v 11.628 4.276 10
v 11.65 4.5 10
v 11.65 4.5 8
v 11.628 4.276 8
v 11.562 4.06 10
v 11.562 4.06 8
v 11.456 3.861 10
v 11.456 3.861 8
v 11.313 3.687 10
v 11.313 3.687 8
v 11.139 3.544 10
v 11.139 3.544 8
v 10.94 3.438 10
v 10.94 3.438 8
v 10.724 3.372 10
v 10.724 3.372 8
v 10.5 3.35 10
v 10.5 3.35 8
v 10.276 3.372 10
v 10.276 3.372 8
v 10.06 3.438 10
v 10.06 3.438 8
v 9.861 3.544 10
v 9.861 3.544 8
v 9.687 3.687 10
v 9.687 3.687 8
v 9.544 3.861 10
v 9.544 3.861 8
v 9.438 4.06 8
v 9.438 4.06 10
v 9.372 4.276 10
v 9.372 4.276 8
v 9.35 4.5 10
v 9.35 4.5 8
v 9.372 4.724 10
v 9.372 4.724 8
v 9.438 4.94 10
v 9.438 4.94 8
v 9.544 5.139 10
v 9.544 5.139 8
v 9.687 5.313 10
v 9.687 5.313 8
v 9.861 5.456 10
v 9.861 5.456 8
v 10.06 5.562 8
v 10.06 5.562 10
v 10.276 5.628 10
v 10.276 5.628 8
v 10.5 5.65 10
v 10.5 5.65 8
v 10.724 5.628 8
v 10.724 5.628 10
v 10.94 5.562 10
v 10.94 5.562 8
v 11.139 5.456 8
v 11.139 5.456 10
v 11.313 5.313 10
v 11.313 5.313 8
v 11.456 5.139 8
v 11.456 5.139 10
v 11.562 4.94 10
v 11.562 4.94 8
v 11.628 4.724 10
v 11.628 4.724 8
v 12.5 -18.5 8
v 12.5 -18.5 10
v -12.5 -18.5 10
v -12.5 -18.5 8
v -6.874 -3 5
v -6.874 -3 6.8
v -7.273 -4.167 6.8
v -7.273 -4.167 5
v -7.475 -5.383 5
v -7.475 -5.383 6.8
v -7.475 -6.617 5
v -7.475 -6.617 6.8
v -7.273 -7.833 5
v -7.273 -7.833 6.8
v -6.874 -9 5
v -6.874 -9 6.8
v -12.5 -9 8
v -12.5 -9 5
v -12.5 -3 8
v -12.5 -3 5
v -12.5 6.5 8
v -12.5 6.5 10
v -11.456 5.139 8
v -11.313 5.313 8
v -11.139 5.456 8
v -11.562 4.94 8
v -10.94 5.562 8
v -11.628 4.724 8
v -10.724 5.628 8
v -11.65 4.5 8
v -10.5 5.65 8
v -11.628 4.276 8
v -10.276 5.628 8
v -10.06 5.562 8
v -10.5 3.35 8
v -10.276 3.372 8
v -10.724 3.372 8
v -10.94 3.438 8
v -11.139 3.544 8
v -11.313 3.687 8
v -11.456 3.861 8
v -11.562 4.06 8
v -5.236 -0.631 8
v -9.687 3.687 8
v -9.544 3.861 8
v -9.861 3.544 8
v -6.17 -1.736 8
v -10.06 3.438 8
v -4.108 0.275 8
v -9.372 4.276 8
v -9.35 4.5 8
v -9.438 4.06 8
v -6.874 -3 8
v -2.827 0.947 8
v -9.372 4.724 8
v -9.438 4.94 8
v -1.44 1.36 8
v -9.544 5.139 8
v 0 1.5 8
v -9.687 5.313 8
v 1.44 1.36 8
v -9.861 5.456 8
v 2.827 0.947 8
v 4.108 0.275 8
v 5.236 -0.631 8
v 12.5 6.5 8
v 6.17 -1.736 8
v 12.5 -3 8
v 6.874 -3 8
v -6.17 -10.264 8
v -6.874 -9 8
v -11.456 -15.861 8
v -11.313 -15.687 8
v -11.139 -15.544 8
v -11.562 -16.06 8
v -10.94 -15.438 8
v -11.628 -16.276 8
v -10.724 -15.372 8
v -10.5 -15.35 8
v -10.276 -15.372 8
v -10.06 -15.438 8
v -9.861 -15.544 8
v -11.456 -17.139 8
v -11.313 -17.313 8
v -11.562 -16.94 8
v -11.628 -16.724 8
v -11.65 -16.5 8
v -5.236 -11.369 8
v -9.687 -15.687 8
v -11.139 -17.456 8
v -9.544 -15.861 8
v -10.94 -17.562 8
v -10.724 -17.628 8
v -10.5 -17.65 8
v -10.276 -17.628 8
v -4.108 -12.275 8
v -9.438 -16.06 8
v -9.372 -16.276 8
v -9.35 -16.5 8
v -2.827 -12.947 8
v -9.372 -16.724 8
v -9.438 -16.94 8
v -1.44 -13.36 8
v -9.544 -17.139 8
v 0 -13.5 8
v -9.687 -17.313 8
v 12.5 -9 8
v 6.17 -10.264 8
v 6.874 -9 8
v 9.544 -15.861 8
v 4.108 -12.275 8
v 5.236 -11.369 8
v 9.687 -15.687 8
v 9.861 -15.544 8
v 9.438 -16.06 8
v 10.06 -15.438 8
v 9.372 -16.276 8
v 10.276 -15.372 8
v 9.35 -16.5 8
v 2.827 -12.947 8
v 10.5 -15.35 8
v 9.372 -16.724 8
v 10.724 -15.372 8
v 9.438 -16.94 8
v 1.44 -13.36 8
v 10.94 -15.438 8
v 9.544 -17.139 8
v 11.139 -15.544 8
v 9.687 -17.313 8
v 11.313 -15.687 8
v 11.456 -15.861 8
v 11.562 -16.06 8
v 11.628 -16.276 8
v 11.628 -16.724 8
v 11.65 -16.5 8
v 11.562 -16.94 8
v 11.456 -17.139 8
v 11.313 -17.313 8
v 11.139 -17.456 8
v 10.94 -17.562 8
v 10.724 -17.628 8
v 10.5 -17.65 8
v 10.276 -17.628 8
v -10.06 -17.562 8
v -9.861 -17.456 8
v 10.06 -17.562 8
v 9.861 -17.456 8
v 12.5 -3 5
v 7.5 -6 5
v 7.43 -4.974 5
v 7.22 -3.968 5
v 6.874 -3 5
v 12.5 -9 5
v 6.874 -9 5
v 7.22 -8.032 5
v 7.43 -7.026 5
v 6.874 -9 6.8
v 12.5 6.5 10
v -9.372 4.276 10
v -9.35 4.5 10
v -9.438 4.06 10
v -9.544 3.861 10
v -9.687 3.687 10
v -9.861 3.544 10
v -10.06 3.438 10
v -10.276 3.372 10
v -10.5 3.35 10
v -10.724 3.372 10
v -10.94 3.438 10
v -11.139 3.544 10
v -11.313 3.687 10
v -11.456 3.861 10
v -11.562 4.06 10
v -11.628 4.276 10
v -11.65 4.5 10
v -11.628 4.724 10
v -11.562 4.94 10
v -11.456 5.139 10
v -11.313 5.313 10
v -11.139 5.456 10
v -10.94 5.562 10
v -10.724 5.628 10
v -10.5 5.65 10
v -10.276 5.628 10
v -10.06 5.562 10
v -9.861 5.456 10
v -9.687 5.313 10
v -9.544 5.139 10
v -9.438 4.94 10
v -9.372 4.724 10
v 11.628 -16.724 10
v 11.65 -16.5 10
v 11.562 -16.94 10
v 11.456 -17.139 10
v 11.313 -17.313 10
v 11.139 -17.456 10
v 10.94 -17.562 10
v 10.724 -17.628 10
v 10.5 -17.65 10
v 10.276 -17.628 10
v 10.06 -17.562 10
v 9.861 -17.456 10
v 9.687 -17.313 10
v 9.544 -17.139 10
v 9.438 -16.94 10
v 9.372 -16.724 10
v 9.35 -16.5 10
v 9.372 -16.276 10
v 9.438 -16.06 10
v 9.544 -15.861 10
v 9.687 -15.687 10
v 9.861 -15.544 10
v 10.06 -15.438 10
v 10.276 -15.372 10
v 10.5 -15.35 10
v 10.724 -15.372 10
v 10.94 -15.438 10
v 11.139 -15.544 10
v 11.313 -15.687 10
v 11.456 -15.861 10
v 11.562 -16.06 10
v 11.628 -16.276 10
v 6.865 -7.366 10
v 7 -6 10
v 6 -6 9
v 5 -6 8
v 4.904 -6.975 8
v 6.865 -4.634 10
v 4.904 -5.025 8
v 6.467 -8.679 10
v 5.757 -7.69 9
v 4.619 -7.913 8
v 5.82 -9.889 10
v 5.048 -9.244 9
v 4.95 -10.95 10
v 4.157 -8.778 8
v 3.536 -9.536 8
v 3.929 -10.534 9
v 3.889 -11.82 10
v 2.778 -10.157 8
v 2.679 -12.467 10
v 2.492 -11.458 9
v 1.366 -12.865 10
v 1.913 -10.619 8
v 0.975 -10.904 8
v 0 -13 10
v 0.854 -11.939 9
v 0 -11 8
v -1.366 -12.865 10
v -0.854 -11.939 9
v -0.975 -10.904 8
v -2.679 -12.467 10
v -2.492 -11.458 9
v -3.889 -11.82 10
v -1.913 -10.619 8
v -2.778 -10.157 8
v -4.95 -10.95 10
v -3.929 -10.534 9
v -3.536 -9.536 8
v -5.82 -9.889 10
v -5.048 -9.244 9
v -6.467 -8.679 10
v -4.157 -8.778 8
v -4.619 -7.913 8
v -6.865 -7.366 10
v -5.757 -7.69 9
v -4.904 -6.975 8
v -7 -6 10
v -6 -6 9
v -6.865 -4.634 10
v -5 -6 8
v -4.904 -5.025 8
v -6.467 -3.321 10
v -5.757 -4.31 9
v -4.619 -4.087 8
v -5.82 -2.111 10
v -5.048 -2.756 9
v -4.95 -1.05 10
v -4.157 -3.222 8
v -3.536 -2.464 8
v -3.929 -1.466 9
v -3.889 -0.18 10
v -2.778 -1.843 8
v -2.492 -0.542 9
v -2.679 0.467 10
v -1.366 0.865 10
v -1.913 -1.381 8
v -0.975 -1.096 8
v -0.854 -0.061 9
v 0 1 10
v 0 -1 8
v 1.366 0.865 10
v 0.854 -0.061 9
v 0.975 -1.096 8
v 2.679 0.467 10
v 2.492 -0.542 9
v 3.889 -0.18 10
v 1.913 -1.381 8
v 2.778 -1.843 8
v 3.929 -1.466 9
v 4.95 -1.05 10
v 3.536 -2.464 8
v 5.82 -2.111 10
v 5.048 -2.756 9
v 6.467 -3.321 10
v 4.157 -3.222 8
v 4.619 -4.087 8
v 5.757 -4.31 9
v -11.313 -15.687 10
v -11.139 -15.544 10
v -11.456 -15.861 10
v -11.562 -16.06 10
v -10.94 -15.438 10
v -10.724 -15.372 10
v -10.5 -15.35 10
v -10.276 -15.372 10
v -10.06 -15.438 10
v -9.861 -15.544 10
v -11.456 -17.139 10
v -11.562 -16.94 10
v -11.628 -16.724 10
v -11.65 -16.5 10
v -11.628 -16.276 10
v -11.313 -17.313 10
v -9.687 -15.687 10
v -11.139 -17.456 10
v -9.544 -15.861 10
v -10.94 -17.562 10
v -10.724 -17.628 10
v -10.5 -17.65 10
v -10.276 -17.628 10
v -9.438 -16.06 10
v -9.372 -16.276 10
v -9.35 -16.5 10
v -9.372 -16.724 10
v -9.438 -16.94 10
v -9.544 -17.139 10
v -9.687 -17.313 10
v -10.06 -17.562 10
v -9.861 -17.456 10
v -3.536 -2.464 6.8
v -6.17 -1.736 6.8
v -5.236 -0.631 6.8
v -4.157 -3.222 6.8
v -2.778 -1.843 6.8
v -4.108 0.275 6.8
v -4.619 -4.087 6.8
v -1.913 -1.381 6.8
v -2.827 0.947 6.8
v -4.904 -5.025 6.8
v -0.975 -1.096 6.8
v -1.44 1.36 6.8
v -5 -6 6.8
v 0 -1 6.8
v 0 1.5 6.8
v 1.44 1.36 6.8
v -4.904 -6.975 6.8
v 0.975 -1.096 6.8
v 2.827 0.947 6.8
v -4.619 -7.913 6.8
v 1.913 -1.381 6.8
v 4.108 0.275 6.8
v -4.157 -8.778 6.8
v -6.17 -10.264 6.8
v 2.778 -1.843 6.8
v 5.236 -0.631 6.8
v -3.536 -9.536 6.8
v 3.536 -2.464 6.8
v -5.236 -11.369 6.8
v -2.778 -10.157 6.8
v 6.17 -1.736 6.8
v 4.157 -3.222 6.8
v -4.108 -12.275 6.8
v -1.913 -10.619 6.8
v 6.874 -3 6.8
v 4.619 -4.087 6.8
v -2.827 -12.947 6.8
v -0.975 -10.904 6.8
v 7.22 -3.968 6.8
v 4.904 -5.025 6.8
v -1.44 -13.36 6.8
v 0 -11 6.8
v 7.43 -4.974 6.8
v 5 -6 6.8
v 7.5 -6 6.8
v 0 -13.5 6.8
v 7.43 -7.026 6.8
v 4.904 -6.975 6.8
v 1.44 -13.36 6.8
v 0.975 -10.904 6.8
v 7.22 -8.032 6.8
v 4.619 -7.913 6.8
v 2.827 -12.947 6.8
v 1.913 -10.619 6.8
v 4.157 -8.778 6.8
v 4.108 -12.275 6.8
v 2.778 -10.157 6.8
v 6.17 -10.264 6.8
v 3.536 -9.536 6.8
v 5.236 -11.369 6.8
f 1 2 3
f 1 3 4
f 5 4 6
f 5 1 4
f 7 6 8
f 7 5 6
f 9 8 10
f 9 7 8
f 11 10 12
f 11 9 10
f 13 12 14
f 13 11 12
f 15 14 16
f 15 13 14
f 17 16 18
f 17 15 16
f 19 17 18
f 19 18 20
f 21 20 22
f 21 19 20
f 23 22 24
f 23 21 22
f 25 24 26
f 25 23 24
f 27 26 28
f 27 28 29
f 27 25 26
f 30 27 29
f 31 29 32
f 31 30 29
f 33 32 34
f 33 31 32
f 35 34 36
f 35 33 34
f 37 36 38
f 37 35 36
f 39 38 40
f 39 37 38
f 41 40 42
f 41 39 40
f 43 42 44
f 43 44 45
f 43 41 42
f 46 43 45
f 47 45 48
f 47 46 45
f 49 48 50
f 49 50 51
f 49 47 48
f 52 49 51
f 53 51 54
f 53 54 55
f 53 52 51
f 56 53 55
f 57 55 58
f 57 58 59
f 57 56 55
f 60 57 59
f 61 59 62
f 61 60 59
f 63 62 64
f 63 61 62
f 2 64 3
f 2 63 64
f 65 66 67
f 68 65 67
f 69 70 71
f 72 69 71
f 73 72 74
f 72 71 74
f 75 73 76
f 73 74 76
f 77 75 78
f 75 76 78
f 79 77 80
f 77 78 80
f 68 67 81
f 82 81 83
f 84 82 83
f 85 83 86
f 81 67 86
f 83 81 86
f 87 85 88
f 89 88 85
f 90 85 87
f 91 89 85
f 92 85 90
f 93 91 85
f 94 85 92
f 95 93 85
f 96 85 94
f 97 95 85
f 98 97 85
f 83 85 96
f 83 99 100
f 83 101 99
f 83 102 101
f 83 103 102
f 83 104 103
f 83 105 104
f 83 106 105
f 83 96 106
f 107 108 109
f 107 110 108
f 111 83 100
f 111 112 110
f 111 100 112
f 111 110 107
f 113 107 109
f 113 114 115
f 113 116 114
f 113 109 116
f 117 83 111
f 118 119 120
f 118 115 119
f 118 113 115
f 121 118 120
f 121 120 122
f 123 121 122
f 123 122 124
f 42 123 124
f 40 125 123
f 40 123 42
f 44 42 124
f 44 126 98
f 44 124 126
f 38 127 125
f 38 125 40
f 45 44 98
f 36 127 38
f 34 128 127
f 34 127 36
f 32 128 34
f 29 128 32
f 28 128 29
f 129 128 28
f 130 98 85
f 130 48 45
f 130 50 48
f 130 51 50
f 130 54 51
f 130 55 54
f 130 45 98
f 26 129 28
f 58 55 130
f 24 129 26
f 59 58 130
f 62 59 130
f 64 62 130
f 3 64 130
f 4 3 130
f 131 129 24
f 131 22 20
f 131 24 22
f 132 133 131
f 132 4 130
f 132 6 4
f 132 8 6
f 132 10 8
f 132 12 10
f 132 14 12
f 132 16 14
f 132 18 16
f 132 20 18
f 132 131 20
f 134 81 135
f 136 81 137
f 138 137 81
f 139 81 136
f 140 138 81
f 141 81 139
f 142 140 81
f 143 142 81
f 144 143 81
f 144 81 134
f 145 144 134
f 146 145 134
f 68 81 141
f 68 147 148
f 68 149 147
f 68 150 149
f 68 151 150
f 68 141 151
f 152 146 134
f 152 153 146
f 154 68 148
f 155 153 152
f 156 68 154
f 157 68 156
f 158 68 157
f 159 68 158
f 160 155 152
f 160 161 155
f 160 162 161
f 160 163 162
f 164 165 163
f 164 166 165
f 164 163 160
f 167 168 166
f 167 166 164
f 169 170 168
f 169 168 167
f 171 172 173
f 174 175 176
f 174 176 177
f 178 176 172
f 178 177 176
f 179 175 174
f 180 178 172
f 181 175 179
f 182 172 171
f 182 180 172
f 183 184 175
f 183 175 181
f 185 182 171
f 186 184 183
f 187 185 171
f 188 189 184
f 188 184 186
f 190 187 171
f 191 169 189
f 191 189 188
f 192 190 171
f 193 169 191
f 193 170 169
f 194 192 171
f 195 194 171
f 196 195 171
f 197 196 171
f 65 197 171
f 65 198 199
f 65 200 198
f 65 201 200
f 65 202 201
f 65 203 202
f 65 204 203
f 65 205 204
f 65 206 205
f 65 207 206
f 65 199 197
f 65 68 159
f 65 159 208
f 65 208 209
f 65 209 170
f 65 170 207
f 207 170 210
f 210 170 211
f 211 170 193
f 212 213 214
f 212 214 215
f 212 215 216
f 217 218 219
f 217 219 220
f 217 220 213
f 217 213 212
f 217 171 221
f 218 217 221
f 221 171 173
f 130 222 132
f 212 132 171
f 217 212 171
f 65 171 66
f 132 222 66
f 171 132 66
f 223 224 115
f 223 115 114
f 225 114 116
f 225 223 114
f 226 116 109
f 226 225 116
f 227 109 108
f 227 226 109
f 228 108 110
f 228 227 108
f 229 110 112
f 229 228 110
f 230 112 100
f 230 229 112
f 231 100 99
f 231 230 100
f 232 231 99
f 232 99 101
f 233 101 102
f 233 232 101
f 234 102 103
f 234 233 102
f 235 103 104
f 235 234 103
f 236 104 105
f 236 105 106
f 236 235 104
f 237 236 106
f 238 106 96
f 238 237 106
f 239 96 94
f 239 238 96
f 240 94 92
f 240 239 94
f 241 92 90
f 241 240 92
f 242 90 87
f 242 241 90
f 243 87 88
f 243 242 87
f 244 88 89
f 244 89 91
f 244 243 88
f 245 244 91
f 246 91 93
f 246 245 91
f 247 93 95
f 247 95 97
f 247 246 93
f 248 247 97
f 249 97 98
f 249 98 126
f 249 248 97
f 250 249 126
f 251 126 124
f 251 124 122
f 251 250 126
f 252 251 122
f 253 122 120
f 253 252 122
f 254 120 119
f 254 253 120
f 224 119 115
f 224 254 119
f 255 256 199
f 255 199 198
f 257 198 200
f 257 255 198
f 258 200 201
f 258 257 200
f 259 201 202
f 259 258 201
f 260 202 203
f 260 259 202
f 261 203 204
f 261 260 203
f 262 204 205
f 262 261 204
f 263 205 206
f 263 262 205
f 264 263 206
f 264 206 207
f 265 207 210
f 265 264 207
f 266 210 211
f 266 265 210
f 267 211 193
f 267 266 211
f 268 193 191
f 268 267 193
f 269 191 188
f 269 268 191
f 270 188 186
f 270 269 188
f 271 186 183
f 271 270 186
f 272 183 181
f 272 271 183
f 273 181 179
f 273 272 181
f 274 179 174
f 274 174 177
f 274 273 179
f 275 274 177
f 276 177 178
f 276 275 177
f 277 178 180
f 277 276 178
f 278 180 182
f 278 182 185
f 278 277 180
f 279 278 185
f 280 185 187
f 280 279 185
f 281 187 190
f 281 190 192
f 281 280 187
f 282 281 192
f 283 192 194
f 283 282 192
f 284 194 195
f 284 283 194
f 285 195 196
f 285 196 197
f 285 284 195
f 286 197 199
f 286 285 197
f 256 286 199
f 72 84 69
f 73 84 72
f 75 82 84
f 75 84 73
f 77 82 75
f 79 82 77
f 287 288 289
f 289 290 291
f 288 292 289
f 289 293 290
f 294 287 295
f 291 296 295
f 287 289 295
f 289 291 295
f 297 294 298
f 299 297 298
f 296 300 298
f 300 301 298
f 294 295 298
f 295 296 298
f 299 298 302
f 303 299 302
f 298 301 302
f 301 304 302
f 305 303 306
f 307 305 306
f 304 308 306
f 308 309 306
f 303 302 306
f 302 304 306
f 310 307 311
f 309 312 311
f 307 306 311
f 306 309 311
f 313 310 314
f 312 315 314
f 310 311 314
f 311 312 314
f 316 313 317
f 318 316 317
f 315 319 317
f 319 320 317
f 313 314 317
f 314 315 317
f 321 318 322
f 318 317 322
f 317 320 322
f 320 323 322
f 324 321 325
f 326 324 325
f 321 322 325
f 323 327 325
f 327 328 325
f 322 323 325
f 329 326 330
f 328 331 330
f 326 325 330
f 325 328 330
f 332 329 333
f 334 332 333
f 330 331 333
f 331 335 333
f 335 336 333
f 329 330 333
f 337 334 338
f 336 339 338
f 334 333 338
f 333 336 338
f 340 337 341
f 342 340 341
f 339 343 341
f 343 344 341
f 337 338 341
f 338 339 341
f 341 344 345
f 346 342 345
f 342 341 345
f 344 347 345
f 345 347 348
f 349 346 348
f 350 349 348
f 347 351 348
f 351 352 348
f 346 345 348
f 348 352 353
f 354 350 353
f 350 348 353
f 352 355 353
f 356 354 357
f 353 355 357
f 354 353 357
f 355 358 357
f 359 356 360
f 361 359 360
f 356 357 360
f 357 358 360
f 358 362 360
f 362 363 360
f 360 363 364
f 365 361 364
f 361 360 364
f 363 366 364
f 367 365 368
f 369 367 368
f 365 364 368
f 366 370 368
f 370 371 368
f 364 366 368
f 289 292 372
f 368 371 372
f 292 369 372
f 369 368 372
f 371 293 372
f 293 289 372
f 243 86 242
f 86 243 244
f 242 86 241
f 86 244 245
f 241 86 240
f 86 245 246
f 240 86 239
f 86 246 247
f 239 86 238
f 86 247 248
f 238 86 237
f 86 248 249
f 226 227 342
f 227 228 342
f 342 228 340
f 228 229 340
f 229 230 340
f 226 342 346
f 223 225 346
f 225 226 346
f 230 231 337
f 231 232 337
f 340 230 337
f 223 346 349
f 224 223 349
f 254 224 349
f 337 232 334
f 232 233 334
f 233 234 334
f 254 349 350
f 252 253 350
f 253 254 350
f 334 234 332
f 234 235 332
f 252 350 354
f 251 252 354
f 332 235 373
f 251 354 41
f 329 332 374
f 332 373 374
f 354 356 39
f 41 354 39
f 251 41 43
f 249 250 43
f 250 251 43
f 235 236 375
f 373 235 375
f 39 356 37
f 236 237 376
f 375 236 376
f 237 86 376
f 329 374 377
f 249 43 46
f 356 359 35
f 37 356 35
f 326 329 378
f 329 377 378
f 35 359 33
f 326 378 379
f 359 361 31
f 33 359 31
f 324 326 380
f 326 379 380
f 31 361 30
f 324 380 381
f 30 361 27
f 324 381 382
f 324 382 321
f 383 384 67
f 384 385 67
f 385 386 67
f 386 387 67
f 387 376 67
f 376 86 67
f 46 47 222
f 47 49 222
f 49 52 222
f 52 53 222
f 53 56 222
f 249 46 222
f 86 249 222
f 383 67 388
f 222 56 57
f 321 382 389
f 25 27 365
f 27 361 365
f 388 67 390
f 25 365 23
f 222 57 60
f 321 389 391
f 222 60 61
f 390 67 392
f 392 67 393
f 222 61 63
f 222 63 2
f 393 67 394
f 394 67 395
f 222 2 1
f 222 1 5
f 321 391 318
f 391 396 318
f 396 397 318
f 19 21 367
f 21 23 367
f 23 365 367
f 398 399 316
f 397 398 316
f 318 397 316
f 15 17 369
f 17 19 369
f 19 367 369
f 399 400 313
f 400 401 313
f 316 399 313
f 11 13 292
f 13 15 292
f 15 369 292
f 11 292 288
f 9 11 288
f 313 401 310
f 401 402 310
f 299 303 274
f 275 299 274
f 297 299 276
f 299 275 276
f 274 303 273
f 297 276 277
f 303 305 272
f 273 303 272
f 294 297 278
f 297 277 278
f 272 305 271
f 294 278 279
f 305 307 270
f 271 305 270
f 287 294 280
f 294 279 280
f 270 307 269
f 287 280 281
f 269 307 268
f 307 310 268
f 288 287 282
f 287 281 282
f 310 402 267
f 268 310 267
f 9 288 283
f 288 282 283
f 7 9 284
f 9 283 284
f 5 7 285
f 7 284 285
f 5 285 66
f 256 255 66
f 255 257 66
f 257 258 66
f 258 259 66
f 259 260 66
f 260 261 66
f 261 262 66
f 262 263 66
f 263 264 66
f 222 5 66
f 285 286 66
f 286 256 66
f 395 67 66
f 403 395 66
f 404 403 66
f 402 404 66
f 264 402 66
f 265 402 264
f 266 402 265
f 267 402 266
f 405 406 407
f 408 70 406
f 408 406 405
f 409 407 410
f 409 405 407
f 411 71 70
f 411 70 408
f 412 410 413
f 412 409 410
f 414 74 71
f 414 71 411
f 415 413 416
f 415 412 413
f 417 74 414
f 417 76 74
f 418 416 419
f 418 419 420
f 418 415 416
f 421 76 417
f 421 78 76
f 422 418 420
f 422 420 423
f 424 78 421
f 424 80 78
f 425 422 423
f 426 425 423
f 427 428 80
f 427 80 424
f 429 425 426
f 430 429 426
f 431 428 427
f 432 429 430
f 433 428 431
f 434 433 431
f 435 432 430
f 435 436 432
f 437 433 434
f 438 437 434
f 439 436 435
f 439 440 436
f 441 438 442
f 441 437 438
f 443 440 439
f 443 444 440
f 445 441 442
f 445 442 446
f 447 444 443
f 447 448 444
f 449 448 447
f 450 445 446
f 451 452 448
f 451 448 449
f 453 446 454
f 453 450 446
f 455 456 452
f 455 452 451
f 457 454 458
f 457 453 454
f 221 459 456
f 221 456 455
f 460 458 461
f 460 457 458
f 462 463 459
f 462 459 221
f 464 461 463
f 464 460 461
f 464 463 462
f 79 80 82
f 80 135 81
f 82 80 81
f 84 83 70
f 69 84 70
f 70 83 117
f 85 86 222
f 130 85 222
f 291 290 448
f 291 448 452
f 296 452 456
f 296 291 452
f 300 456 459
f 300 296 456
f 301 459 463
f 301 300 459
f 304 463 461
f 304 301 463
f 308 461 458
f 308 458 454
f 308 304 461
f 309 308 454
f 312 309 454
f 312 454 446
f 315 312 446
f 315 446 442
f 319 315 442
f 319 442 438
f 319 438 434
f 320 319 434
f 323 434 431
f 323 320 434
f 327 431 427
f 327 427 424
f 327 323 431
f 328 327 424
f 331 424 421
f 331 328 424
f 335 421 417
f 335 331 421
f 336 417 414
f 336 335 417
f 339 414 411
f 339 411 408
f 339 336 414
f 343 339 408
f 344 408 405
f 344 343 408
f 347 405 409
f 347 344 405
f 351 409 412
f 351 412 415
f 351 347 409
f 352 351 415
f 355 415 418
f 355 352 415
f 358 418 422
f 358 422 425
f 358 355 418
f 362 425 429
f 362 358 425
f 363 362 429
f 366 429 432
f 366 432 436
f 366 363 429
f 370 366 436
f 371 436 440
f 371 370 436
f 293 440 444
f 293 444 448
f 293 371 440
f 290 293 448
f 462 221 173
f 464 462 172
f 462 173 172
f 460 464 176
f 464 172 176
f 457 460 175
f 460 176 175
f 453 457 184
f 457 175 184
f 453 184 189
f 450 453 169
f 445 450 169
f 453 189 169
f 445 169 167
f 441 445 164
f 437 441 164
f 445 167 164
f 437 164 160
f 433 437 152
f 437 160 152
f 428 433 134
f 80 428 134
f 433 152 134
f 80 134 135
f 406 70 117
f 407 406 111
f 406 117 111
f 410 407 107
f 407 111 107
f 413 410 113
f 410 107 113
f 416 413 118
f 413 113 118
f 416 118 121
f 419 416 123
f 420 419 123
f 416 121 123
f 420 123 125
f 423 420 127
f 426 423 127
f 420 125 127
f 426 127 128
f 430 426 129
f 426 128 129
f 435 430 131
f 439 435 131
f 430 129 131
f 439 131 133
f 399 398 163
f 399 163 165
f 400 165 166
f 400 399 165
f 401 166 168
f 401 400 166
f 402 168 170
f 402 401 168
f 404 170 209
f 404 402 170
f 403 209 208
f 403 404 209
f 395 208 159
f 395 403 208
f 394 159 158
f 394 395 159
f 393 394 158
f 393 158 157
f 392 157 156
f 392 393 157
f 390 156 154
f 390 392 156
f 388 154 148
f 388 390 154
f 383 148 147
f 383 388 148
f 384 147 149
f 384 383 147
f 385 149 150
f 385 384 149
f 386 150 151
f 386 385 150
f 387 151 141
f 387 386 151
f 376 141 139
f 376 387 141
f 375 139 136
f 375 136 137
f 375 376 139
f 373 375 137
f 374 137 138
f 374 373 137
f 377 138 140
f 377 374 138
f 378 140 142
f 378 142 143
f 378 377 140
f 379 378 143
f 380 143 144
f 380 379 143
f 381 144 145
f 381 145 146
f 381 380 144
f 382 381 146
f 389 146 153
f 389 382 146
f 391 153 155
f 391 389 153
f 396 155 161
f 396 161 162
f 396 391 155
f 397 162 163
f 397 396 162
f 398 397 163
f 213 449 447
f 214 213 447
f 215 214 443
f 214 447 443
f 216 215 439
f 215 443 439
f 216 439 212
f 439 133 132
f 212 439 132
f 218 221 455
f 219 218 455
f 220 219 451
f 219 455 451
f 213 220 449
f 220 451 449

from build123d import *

# Parameters (mm, degrees)
F0_R     = 5
F1_DEPTH = 3.2
F0_R_2   = 1.15
F2_DEPTH = 2
F3_DEPTH = 5
F4_SIZE  = 2
F5_ANGLE = 180


with BuildPart() as f1:
    # F0 (on Top) → F1 (new body)
    with BuildSketch(Plane.XY):
        with BuildLine():
            ThreePointArc((6.873864, -3), (7.341797, -1.532322), (7.5, 0))
            ThreePointArc((7.5, 0), (7.341797, 1.532322), (6.873864, 3))
            ThreePointArc((6.873864, 3), (0, 7.5), (-6.873864, 3))
            ThreePointArc((-6.873864, 3), (-7.5, 0), (-6.873864, -3))
            ThreePointArc((-6.873864, -3), (0, -7.5), (6.873864, -3))
        make_face()
        Circle(F0_R, mode=Mode.SUBTRACT)
    extrude(amount=F1_DEPTH)

    # F0 (on Top) → F2 (join)
    with BuildSketch(Plane.XY):
        with BuildLine():
            ThreePointArc((-6.873864, 3), (0, 7.5), (6.873864, 3))
            Line((6.873864, 3), (12.5, 3))
            Line((12.5, 3), (12.5, 12.5))
            Line((12.5, 12.5), (-12.5, 12.5))
            Line((-12.5, 12.5), (-12.5, 3))
            Line((-12.5, 3), (-6.873864, 3))
        make_face()
        with Locations((-10.5, 10.5)):
            Circle(F0_R_2, mode=Mode.SUBTRACT)
        with Locations((10.5, 10.5)):
            Circle(F0_R_2, mode=Mode.SUBTRACT)
        with BuildLine():
            Line((12.5, -3), (6.873864, -3))
            ThreePointArc((6.873864, -3), (0, -7.5), (-6.873864, -3))
            Line((-6.873864, -3), (-12.5, -3))
            Line((-12.5, -3), (-12.5, -12.5))
            Line((-12.5, -12.5), (12.5, -12.5))
            Line((12.5, -12.5), (12.5, -3))
        make_face()
        with Locations((-10.5, -10.5)):
            Circle(F0_R_2, mode=Mode.SUBTRACT)
        with Locations((10.5, -10.5)):
            Circle(F0_R_2, mode=Mode.SUBTRACT)
    extrude(amount=F2_DEPTH)

    # F0 (on Top) → F3 (join)
    with BuildSketch(Plane.XY):
        with BuildLine():
            ThreePointArc((-6.873864, -3), (-7.5, 0), (-6.873864, 3))
            Line((-6.873864, 3), (-12.5, 3))
            Line((-12.5, 3), (-12.5, -3))
            Line((-12.5, -3), (-6.873864, -3))
        make_face()
        with BuildLine():
            ThreePointArc((6.873864, 3), (7.341797, 1.532322), (7.5, 0))
            ThreePointArc((7.5, 0), (7.341797, -1.532322), (6.873864, -3))
            Line((6.873864, -3), (12.5, -3))
            Line((12.5, -3), (12.5, 3))
            Line((12.5, 3), (6.873864, 3))
        make_face()
    extrude(amount=F3_DEPTH)

    # F4
    f4_edges = [f1.edges().sort_by_distance(p)[0] for p in [
        (-5, 0, 0),
    ]]
    chamfer(f4_edges, length=F4_SIZE)


with BuildPart() as f1_1:
    # F5: moved
    add(f1.part.rotate(Axis((9.686932, -3, 5), (1, 0, 0)), F5_ANGLE))


solid = f1_1.part
